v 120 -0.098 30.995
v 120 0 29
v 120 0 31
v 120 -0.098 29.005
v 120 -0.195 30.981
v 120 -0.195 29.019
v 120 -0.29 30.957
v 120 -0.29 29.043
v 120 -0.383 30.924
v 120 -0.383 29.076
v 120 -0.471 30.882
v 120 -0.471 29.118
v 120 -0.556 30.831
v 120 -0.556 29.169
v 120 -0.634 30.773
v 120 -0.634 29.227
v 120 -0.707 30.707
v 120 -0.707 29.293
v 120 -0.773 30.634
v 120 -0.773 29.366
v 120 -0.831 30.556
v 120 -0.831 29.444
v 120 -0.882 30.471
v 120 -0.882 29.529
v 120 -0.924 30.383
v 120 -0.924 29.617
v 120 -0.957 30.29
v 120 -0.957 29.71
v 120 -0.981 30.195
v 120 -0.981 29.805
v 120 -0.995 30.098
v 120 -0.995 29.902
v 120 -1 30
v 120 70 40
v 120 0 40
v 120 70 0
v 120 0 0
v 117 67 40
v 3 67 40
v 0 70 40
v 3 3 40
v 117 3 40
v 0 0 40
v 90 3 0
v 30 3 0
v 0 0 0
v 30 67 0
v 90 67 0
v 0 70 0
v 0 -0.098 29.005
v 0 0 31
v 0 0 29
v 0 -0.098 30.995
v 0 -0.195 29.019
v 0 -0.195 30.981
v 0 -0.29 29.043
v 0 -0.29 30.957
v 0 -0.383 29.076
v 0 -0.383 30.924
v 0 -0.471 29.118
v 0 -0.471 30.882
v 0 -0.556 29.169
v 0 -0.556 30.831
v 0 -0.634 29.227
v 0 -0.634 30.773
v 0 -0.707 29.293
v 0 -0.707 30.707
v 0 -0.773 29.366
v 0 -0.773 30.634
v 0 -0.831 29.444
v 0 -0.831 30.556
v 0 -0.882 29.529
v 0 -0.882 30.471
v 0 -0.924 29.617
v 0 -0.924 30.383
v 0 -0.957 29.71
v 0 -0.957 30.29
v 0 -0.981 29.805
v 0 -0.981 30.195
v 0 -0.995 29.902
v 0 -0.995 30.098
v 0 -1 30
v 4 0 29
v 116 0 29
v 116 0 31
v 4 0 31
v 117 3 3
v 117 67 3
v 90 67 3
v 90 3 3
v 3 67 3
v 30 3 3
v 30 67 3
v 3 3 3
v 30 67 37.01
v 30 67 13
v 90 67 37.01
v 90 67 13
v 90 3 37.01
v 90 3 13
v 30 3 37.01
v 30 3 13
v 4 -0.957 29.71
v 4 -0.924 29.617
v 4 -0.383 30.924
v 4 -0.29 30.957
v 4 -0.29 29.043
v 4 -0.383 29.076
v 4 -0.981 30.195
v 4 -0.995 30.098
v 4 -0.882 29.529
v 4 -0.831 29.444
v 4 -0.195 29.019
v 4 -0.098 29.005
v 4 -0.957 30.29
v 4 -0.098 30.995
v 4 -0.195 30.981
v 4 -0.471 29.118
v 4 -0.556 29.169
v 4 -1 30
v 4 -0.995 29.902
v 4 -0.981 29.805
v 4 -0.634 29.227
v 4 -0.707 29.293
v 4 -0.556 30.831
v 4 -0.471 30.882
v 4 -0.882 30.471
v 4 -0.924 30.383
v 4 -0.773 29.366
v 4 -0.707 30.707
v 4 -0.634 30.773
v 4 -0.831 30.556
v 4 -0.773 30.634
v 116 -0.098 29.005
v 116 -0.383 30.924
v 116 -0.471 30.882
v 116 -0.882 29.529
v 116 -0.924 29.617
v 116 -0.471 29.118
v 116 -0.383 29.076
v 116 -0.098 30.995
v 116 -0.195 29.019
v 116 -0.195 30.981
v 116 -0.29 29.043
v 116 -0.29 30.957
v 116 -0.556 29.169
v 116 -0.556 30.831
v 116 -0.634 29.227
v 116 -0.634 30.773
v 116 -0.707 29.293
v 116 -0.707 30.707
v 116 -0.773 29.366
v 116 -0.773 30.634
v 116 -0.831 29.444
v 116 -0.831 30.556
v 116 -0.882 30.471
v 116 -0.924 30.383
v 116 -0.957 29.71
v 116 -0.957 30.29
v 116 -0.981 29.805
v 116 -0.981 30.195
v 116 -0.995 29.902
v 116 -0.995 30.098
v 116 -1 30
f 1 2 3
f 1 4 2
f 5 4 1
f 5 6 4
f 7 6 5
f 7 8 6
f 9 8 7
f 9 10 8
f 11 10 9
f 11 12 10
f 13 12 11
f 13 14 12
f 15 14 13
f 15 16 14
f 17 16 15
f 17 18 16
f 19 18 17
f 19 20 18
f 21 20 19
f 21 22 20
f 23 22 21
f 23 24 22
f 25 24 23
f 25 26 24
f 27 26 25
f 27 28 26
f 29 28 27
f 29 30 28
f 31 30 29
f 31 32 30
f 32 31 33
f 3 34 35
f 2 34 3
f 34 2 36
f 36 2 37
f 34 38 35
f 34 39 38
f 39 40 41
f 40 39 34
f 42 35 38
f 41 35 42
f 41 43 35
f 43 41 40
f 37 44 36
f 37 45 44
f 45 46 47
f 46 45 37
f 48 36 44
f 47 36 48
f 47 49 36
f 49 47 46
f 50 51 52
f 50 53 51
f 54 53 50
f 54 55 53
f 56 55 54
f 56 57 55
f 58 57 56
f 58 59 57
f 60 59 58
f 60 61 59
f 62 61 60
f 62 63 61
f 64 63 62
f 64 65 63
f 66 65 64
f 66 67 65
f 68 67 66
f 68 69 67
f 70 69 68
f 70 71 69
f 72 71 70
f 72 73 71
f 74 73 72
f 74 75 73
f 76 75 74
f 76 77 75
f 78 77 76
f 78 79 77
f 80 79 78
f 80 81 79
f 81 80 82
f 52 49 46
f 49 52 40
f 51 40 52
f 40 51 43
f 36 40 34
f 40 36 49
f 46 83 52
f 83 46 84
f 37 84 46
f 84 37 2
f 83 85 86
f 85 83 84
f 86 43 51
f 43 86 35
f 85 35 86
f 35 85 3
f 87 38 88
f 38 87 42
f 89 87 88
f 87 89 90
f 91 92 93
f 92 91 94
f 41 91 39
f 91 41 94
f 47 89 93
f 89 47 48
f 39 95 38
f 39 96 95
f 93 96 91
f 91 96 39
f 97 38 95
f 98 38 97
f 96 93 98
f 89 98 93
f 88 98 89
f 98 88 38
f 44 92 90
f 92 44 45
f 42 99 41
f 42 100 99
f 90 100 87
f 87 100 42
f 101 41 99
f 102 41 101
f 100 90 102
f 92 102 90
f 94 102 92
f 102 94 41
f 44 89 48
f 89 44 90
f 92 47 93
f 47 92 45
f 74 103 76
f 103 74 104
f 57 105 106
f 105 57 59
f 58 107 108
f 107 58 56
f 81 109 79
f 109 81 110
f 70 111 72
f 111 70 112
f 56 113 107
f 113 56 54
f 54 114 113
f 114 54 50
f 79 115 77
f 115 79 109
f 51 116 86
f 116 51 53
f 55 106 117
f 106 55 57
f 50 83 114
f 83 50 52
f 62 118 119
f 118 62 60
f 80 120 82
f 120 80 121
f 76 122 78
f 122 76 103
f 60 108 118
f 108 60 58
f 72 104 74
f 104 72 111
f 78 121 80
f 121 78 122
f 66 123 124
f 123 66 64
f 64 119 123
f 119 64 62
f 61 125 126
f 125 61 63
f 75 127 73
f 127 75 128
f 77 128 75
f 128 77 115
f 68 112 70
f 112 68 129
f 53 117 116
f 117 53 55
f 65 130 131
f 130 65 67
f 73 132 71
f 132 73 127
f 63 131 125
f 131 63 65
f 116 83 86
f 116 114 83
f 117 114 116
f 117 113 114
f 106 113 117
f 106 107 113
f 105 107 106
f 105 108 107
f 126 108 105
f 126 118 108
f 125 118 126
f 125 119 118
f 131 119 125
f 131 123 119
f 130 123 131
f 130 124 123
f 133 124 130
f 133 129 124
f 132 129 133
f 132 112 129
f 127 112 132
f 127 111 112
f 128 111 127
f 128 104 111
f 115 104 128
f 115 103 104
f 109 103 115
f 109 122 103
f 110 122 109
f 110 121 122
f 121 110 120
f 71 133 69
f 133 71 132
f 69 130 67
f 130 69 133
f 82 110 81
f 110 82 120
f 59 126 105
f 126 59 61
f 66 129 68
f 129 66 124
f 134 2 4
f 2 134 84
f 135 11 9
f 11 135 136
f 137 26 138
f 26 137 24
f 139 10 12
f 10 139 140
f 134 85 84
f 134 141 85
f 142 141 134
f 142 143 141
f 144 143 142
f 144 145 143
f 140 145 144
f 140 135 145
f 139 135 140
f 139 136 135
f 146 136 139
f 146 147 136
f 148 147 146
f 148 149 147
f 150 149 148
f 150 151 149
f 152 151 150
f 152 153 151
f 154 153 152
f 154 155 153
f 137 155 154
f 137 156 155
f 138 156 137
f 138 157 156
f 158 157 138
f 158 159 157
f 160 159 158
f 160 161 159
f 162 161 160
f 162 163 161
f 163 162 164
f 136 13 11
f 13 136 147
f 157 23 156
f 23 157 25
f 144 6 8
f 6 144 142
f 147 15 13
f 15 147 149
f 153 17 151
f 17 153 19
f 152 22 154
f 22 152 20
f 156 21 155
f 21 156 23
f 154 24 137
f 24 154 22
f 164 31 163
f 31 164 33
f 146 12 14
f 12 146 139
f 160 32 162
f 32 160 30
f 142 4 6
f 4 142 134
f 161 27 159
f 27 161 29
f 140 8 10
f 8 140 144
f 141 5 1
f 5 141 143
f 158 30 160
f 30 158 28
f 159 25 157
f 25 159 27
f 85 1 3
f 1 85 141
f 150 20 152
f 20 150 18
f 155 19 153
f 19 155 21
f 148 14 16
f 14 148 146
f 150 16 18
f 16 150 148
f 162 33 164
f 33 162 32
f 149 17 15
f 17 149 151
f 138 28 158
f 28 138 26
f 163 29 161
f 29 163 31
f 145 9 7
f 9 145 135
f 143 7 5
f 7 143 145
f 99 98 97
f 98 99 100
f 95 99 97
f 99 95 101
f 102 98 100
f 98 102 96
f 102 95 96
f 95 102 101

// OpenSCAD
// Buffer tank for mini horizontal gel-electrophoresis box
// Outer dimensions: 120mm (X) x 70mm (Y) x 40mm (Z)
// Wall thickness: 3mm, Floor thickness: 3mm
// Platform: 60mm long in X (centred), full inner width (Y), top at z = 13mm (10mm above inner floor)

// Dimensions
outer_x = 120;
outer_y = 70;
outer_z = 40;
wall_thick = 3;
floor_thick = 3;
platform_height = 13; // z-coordinate of platform top
platform_len = 60;
hole_dia = 2;
hole_z = 30;

// Derived dimensions
inner_x = outer_x - 2 * wall_thick;
inner_y = outer_y - 2 * wall_thick;
inner_z = outer_z - floor_thick;
platform_width = inner_y; // spans full inner width
platform_start_x = (inner_x - platform_len) / 2;
platform_end_x = platform_start_x + platform_len;

// Main tank shell (outer box with hollow interior)
module tank_shell() {
    difference() {
        // Outer shell
        cube([outer_x, outer_y, outer_z]);
        
        // Hollow interior (walls and floor only)
        translate([wall_thick, wall_thick, floor_thick])
            cube([inner_x, inner_y, inner_z]);
        
        // Cut out platform area from the bottom (to create hollow under platform)
        // Platform is at platform_height (z=13), so we need to hollow from z=0 to z=platform_height
        // but only for the platform area (centred in X, full inner Y)
        translate([wall_thick + platform_start_x, wall_thick, 0])
            cube([platform_len, inner_y, platform_height + 0.01]);
    }
}

// Platform (solid raised platform)
module platform() {
    translate([wall_thick + platform_start_x, wall_thick, platform_height])
        cube([platform_len, inner_y, inner_z - platform_height + 0.01]);
}

// Electrode holes in end walls
module electrode_holes() {
    hole_extend = 1; // extra length to ensure clean cut
    
    // Left hole (at x=0 wall, y=0, z=30)
    // Hole goes through the left wall (at x=0) along +X direction
    // Position: x=0, y=0, z=hole_z
    translate([0, 0, hole_z])
        rotate([0, 90, 0])
        cylinder(h = wall_thick + hole_extend, r = hole_dia / 2, $fn = 64);
    
    // Right hole (at x=outer_x wall, y=0, z=30)
    // Hole goes through the right wall (at x=outer_x) along -X direction
    // Position: x=outer_x, y=0, z=hole_z
    translate([outer_x, 0, hole_z])
        rotate([0, 90, 180])
        cylinder(h = wall_thick + hole_extend, r = hole_dia / 2, $fn = 64);
}

// Build the buffer tank
module buffer_tank() {
    union() {
        // Tank shell
        tank_shell();
        
        // Platform
        platform();
        
        // Electrode holes
        electrode_holes();
    }
}

// Render
$fn = 64;
buffer_tank();
